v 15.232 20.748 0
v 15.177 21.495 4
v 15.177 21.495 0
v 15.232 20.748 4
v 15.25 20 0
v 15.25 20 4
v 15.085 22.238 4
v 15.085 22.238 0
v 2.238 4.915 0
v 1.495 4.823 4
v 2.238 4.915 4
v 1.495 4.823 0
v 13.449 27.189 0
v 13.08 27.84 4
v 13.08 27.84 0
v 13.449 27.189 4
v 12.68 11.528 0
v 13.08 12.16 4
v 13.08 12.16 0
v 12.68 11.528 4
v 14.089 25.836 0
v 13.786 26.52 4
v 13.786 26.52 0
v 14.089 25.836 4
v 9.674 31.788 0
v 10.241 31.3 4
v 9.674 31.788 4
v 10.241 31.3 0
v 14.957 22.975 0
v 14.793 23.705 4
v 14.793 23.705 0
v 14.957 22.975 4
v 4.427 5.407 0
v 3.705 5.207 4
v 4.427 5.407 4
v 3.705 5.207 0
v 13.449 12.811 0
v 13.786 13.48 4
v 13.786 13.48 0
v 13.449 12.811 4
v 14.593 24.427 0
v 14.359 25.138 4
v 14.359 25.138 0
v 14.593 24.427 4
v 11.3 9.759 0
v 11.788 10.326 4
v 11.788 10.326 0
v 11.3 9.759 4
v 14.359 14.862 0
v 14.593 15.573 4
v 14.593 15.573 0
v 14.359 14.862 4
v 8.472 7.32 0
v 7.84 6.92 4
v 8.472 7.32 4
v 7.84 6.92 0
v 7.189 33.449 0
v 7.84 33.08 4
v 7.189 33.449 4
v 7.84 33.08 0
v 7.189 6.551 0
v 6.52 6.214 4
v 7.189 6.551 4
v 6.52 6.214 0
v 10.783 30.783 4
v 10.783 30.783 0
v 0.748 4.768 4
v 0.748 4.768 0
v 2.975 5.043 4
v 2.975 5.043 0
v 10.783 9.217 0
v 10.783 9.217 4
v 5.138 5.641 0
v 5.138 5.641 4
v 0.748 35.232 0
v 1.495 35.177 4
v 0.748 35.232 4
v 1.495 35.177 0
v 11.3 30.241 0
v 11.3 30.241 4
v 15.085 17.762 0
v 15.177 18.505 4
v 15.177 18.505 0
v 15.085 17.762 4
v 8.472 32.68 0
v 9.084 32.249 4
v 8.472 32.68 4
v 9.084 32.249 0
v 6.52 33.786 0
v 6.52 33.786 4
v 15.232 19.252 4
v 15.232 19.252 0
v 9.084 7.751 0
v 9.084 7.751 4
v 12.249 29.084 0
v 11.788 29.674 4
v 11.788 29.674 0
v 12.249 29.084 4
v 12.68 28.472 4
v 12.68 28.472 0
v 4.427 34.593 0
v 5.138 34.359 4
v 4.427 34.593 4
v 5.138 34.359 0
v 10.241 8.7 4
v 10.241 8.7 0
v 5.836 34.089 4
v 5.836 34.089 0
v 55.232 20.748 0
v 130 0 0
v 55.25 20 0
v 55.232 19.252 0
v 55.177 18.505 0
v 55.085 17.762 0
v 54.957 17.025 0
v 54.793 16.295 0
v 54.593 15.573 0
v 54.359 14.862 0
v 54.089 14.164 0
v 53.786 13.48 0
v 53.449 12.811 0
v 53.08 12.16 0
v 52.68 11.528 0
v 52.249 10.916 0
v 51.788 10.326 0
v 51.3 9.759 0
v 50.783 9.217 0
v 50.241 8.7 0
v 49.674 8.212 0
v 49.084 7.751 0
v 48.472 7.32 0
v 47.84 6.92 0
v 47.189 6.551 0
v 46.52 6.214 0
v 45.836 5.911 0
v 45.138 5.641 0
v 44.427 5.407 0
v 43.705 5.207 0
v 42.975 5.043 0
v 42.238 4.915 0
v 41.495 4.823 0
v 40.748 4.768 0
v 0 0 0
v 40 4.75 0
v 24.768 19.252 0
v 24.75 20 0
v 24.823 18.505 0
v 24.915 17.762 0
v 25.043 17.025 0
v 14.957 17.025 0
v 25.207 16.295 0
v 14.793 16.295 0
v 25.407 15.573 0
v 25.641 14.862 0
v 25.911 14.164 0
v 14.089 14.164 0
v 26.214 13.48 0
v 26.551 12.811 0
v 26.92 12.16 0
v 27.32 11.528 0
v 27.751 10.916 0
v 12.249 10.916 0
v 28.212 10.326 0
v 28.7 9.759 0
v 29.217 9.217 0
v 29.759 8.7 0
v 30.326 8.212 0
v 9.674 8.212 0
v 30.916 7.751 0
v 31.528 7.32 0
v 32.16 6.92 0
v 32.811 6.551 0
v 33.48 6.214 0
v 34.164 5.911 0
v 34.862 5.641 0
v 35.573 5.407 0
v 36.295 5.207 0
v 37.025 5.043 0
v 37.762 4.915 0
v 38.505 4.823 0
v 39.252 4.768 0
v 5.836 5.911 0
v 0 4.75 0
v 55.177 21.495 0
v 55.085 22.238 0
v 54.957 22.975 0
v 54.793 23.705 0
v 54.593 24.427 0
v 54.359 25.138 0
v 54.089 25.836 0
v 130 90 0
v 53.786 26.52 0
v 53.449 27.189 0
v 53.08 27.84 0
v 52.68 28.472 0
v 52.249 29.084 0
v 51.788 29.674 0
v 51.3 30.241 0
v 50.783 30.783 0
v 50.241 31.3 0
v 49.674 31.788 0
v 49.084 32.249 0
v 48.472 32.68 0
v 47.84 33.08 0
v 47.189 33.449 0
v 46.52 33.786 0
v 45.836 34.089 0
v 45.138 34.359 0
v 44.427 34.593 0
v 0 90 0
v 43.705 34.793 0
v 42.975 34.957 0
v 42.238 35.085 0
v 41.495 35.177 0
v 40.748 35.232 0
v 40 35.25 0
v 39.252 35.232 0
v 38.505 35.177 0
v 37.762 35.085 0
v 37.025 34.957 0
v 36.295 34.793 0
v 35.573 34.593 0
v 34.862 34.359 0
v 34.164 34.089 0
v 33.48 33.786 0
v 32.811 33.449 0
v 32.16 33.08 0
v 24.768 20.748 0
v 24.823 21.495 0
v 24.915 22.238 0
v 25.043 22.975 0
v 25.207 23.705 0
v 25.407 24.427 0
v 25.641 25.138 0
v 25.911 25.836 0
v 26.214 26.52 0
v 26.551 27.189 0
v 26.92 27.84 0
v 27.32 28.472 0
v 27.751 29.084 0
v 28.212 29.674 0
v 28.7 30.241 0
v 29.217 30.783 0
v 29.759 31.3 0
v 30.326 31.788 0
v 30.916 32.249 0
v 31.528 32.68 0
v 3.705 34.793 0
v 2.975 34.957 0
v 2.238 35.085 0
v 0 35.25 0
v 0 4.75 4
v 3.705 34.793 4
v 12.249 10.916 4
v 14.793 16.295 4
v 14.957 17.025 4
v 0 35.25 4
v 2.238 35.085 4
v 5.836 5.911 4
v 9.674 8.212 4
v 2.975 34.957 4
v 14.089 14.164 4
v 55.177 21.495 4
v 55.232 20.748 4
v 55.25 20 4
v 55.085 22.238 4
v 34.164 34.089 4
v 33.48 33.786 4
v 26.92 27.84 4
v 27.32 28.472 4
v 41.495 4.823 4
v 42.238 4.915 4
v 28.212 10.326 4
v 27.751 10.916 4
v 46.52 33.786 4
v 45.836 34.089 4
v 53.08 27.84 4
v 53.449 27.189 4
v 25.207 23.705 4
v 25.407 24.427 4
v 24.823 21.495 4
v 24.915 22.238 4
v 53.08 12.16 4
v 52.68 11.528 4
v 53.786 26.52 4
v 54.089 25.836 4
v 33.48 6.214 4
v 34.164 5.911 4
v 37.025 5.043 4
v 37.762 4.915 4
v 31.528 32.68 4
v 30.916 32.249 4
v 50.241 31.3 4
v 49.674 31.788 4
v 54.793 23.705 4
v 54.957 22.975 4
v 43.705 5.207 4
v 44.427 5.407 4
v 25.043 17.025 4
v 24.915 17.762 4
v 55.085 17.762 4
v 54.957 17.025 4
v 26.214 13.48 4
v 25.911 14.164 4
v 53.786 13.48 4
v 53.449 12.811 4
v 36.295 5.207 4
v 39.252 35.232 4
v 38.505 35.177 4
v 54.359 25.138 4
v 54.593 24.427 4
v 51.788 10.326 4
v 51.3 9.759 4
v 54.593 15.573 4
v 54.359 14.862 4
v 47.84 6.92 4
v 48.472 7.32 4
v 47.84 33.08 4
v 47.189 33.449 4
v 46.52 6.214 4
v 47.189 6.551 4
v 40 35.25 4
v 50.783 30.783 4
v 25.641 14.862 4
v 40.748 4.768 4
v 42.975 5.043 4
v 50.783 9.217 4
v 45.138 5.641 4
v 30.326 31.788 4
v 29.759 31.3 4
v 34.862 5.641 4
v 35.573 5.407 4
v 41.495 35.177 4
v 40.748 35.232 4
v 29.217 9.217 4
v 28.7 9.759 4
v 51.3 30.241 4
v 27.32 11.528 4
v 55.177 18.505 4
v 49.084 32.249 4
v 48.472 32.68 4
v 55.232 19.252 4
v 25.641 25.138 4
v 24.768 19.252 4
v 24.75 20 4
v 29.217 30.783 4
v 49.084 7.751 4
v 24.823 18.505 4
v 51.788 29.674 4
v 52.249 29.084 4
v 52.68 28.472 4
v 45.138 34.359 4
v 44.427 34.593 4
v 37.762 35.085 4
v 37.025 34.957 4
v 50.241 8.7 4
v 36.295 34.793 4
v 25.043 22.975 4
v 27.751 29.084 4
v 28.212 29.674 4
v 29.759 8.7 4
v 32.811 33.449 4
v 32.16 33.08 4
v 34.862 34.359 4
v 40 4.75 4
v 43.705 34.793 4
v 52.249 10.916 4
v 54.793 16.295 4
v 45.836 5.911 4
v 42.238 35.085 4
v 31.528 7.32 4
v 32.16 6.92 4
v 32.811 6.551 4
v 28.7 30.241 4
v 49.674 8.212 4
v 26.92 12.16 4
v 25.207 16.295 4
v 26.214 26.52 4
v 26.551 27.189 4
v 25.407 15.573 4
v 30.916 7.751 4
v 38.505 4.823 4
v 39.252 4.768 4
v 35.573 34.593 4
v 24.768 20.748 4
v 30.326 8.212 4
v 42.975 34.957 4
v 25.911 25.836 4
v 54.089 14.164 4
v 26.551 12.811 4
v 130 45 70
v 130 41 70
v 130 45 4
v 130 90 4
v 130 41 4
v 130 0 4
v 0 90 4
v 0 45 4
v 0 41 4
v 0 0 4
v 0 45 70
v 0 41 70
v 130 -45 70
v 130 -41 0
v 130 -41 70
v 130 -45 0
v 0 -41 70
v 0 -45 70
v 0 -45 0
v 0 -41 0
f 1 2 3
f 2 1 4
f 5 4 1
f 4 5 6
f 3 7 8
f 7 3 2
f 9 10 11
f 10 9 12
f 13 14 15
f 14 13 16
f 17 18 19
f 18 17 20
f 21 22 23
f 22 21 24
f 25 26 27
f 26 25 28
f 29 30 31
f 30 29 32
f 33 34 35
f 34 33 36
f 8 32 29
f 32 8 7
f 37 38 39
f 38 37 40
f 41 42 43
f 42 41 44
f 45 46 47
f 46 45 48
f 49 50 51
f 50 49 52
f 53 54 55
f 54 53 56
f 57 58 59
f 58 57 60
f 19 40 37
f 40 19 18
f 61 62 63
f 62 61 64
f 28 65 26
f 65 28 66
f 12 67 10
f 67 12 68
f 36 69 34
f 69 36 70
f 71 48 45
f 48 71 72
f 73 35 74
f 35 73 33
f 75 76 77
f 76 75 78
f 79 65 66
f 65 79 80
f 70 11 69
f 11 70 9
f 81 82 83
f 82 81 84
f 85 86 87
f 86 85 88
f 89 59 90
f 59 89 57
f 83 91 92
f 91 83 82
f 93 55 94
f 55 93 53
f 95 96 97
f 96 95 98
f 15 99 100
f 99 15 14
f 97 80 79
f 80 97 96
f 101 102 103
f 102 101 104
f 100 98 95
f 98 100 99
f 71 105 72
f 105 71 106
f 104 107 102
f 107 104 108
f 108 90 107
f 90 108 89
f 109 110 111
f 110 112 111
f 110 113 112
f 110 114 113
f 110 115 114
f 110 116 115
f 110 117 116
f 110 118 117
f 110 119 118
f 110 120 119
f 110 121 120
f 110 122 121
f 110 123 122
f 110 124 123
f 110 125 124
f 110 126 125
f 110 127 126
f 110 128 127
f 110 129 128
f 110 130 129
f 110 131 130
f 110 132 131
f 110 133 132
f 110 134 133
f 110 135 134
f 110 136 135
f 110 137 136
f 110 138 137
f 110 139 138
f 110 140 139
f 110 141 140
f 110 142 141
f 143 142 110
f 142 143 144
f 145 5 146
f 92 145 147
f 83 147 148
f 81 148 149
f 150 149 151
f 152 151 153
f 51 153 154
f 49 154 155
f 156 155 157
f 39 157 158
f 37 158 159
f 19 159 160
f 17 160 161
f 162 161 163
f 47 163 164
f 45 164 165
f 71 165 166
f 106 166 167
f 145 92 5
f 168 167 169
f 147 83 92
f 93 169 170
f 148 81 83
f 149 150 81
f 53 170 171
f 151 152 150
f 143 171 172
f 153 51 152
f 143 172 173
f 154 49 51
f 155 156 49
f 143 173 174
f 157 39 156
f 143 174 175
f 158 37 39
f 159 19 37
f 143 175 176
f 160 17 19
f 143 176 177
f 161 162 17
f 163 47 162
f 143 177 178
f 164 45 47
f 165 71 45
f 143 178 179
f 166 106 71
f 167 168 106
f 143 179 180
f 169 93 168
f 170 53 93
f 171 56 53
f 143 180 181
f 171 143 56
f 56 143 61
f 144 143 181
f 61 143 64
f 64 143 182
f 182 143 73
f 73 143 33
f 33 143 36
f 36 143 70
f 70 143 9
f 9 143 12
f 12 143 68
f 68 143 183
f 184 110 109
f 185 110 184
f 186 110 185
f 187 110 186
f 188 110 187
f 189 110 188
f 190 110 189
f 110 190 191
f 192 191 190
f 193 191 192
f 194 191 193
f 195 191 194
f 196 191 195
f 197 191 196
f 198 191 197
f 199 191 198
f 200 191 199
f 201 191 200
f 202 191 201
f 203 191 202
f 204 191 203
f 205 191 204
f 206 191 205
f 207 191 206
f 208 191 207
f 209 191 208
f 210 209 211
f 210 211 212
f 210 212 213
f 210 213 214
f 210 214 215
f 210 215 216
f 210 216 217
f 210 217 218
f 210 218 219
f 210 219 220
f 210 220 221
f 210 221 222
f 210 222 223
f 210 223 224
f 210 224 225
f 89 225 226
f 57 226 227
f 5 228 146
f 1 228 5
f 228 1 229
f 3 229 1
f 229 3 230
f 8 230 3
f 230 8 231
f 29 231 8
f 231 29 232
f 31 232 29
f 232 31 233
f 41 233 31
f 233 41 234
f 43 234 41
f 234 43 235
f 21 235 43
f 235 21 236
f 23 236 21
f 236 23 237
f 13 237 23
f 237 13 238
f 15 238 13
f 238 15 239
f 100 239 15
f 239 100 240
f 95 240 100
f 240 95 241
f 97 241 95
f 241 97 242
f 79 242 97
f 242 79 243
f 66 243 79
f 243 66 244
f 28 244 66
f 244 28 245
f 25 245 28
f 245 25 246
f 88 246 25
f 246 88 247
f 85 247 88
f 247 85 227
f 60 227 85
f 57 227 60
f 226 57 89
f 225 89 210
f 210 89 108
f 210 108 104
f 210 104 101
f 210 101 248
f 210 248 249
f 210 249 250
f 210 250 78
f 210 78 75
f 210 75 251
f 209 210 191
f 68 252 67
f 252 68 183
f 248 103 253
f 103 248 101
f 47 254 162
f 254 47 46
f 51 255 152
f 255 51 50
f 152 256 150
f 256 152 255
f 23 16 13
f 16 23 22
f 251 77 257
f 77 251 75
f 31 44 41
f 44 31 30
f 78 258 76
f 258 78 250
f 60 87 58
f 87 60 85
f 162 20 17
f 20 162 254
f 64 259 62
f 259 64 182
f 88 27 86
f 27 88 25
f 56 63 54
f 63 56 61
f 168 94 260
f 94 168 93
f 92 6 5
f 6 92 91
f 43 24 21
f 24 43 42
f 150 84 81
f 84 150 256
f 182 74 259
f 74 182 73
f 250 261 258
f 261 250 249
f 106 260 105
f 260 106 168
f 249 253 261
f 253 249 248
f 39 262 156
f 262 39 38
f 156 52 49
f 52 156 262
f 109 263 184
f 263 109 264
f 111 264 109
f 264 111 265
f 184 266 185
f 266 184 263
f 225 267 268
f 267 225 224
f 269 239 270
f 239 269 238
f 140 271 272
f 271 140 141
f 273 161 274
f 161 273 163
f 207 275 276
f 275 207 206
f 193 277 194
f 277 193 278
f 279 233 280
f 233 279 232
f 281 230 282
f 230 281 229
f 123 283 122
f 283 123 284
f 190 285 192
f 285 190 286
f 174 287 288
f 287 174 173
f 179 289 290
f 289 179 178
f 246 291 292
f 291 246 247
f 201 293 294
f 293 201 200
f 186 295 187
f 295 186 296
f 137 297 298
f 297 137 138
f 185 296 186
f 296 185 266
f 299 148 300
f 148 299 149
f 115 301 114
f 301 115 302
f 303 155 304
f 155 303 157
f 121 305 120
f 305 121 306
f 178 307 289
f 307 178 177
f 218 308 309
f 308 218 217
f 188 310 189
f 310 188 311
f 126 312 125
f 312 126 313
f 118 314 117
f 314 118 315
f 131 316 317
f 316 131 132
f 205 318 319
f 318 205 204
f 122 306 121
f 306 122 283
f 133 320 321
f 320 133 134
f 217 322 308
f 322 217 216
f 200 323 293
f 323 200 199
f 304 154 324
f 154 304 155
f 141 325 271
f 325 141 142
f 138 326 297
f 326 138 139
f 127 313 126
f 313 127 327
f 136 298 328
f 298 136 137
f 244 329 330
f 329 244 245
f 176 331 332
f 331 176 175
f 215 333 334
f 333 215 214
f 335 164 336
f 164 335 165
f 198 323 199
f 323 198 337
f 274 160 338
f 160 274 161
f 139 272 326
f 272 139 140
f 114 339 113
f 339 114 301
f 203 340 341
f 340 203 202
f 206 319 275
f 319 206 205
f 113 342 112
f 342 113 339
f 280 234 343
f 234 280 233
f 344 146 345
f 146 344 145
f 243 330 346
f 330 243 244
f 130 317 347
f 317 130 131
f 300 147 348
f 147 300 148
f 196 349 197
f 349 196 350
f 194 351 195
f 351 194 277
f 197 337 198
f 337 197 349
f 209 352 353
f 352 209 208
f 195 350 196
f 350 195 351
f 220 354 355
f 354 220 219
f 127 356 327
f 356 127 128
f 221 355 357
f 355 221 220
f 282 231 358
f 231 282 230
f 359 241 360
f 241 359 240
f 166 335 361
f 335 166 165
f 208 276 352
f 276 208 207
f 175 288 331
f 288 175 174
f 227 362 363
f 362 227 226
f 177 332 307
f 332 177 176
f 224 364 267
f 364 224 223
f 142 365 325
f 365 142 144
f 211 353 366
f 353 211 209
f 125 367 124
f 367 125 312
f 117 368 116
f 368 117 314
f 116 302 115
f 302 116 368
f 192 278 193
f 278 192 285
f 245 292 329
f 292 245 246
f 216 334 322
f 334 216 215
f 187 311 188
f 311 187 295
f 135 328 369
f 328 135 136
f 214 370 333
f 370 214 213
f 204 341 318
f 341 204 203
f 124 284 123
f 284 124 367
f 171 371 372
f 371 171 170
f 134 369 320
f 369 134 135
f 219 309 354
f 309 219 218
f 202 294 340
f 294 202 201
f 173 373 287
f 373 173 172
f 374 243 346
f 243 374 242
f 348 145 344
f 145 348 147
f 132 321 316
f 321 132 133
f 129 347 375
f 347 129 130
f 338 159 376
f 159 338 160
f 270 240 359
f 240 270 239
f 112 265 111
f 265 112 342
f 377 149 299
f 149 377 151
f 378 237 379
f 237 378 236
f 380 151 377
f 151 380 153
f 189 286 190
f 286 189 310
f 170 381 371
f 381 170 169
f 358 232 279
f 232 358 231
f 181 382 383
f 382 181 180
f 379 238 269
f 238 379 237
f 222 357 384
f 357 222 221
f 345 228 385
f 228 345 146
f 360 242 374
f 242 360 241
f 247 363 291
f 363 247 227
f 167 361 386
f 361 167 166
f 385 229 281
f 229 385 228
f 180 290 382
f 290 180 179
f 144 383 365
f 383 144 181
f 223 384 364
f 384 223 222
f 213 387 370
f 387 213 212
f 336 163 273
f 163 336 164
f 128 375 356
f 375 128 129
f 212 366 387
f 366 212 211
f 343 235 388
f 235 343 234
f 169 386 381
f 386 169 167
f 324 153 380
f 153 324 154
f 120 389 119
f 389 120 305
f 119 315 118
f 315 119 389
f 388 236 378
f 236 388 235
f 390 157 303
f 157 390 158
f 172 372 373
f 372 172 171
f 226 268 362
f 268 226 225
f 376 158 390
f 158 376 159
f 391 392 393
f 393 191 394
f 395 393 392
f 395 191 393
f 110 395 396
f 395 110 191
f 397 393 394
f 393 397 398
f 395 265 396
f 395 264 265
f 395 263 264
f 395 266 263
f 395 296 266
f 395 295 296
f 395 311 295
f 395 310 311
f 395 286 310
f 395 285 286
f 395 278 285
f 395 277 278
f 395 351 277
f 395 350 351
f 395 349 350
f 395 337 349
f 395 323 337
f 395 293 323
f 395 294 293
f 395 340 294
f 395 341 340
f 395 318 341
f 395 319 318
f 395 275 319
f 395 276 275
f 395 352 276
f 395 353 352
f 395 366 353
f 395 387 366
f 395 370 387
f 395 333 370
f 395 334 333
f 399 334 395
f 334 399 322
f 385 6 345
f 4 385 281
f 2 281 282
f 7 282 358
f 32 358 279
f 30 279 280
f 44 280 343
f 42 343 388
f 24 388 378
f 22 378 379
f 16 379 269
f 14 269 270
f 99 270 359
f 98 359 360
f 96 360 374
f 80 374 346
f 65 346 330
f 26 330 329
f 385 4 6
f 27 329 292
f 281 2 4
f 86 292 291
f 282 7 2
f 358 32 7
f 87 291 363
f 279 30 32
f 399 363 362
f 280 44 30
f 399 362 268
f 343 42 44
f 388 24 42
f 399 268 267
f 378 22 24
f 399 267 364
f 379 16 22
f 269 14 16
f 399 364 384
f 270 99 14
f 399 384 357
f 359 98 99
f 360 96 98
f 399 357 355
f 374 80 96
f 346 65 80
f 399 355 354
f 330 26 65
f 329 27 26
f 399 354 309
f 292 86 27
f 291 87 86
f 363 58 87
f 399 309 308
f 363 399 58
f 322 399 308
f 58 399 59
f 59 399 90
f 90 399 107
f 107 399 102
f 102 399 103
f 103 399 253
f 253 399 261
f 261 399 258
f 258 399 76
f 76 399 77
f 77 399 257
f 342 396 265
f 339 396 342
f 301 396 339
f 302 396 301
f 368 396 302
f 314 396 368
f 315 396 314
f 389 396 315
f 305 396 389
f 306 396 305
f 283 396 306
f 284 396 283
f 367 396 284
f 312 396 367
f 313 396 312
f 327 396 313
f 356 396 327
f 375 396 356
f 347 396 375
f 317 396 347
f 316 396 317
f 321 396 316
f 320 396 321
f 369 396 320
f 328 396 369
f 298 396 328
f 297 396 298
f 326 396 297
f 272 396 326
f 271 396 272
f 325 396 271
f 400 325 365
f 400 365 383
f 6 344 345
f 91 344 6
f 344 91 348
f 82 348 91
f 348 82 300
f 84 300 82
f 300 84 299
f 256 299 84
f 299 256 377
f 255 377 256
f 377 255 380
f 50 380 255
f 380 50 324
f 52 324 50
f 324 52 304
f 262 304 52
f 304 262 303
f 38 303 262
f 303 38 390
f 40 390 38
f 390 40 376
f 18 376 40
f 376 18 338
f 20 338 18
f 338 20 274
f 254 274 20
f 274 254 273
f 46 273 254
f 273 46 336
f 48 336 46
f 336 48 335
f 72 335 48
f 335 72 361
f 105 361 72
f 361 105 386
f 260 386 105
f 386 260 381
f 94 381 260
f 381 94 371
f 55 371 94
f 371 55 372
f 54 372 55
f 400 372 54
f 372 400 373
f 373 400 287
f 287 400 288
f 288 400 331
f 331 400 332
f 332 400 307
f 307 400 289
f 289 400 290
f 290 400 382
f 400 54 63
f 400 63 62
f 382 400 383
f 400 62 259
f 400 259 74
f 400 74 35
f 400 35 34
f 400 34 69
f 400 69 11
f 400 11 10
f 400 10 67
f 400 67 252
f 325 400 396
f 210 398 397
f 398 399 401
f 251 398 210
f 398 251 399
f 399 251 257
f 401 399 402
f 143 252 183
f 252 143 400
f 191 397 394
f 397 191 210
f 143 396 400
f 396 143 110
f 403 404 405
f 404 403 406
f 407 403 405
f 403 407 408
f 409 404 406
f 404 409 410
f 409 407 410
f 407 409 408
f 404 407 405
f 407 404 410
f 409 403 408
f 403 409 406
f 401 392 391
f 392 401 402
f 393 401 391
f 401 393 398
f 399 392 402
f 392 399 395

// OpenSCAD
// Rack for six 50 mL conical (Falcon-type) tubes
// Print orientation: Upside down. Flat plate on bed (Z=0).
// After printing, flip over to stand on the two walls.

// --- Dimensions ---
// Plate dimensions
W_PLATE_X = 130; // mm
W_PLATE_Y = 90;  // mm
H_PLATE = 4;     // mm

// Hole specifications
N_ROWS = 3;      // Rows along X
N_COLS = 2;      // Cols along Y
D_HOLE = 30.5;   // mm (Diameter)
C_X = 40;        // mm (Centre-to-centre spacing X)
C_Y = 40;        // mm (Centre-to-centre spacing Y)

// Wall specifications
H_WALL = 70;     // mm (Total height from bed)
W_WALL_THICK = 4; // mm (Thickness of wall)

// --- Derived Positions ---
// Plate is centred on origin
// Hole grid positions
// Rows along X: 3 holes. Spacing 40mm. Centres at: -40, 0, +40
HOLE_X_POS = [-40, 0, 40];

// Cols along Y: 2 holes. Spacing 40mm.
// Plate Y is 90mm. Half is 45mm.
// We need to fit 2 holes with 40mm spacing symmetrically.
// Distance between holes = 40mm.
// Center of the pair = 0.
// y1 = -20, y2 = +20.
HOLE_Y_POS = [-20, 20];

// Wall positions
// Walls run along the long edges (X direction).
// Plate Y is 90mm. Half is 45mm.
// Wall thickness is 4mm.
// Wall 1 (Left): Extends from Y = -45 to Y = -41
// Wall 2 (Right): Extends from Y = +41 to Y = +45
WALL_Y_START_LEFT = -45;
WALL_Y_END_LEFT = -41;

WALL_Y_START_RIGHT = 41;
WALL_Y_END_RIGHT = 45;

// --- Configuration ---
$fn = 128; // High resolution for holes and walls

module main() {
    // Create the base plate
    // We use difference() to cut holes from the plate
    difference() {
        // 1. The Plate
        translate([0, 0, 0]) {
            cube([W_PLATE_X, W_PLATE_Y, H_PLATE], center = false);
        }
        
        // 2. The Holes
        for (xi = [0:N_ROWS-1]) {
            for (yi = [0:N_COLS-1]) {
                translate([HOLE_X_POS[xi], HOLE_Y_POS[yi], 0]) {
                    // Cut cylinder through the plate
                    cylinder(h = H_PLATE + 0.1, d = D_HOLE, $fn = 128);
                }
            }
        }
    }
    
    // Add the walls
    // Left Wall: 130mm long, 4mm thick (Y), 70mm high
    translate([0, WALL_Y_START_LEFT, 0]) {
        cube([W_PLATE_X, WALL_Y_END_LEFT - WALL_Y_START_LEFT, H_WALL], center = false);
    }
    
    // Right Wall: 130mm long, 4mm thick (Y), 70mm high
    translate([0, WALL_Y_START_RIGHT, 0]) {
        cube([W_PLATE_X, WALL_Y_END_RIGHT - WALL_Y_START_RIGHT, H_WALL], center = false);
    }
}

main();
